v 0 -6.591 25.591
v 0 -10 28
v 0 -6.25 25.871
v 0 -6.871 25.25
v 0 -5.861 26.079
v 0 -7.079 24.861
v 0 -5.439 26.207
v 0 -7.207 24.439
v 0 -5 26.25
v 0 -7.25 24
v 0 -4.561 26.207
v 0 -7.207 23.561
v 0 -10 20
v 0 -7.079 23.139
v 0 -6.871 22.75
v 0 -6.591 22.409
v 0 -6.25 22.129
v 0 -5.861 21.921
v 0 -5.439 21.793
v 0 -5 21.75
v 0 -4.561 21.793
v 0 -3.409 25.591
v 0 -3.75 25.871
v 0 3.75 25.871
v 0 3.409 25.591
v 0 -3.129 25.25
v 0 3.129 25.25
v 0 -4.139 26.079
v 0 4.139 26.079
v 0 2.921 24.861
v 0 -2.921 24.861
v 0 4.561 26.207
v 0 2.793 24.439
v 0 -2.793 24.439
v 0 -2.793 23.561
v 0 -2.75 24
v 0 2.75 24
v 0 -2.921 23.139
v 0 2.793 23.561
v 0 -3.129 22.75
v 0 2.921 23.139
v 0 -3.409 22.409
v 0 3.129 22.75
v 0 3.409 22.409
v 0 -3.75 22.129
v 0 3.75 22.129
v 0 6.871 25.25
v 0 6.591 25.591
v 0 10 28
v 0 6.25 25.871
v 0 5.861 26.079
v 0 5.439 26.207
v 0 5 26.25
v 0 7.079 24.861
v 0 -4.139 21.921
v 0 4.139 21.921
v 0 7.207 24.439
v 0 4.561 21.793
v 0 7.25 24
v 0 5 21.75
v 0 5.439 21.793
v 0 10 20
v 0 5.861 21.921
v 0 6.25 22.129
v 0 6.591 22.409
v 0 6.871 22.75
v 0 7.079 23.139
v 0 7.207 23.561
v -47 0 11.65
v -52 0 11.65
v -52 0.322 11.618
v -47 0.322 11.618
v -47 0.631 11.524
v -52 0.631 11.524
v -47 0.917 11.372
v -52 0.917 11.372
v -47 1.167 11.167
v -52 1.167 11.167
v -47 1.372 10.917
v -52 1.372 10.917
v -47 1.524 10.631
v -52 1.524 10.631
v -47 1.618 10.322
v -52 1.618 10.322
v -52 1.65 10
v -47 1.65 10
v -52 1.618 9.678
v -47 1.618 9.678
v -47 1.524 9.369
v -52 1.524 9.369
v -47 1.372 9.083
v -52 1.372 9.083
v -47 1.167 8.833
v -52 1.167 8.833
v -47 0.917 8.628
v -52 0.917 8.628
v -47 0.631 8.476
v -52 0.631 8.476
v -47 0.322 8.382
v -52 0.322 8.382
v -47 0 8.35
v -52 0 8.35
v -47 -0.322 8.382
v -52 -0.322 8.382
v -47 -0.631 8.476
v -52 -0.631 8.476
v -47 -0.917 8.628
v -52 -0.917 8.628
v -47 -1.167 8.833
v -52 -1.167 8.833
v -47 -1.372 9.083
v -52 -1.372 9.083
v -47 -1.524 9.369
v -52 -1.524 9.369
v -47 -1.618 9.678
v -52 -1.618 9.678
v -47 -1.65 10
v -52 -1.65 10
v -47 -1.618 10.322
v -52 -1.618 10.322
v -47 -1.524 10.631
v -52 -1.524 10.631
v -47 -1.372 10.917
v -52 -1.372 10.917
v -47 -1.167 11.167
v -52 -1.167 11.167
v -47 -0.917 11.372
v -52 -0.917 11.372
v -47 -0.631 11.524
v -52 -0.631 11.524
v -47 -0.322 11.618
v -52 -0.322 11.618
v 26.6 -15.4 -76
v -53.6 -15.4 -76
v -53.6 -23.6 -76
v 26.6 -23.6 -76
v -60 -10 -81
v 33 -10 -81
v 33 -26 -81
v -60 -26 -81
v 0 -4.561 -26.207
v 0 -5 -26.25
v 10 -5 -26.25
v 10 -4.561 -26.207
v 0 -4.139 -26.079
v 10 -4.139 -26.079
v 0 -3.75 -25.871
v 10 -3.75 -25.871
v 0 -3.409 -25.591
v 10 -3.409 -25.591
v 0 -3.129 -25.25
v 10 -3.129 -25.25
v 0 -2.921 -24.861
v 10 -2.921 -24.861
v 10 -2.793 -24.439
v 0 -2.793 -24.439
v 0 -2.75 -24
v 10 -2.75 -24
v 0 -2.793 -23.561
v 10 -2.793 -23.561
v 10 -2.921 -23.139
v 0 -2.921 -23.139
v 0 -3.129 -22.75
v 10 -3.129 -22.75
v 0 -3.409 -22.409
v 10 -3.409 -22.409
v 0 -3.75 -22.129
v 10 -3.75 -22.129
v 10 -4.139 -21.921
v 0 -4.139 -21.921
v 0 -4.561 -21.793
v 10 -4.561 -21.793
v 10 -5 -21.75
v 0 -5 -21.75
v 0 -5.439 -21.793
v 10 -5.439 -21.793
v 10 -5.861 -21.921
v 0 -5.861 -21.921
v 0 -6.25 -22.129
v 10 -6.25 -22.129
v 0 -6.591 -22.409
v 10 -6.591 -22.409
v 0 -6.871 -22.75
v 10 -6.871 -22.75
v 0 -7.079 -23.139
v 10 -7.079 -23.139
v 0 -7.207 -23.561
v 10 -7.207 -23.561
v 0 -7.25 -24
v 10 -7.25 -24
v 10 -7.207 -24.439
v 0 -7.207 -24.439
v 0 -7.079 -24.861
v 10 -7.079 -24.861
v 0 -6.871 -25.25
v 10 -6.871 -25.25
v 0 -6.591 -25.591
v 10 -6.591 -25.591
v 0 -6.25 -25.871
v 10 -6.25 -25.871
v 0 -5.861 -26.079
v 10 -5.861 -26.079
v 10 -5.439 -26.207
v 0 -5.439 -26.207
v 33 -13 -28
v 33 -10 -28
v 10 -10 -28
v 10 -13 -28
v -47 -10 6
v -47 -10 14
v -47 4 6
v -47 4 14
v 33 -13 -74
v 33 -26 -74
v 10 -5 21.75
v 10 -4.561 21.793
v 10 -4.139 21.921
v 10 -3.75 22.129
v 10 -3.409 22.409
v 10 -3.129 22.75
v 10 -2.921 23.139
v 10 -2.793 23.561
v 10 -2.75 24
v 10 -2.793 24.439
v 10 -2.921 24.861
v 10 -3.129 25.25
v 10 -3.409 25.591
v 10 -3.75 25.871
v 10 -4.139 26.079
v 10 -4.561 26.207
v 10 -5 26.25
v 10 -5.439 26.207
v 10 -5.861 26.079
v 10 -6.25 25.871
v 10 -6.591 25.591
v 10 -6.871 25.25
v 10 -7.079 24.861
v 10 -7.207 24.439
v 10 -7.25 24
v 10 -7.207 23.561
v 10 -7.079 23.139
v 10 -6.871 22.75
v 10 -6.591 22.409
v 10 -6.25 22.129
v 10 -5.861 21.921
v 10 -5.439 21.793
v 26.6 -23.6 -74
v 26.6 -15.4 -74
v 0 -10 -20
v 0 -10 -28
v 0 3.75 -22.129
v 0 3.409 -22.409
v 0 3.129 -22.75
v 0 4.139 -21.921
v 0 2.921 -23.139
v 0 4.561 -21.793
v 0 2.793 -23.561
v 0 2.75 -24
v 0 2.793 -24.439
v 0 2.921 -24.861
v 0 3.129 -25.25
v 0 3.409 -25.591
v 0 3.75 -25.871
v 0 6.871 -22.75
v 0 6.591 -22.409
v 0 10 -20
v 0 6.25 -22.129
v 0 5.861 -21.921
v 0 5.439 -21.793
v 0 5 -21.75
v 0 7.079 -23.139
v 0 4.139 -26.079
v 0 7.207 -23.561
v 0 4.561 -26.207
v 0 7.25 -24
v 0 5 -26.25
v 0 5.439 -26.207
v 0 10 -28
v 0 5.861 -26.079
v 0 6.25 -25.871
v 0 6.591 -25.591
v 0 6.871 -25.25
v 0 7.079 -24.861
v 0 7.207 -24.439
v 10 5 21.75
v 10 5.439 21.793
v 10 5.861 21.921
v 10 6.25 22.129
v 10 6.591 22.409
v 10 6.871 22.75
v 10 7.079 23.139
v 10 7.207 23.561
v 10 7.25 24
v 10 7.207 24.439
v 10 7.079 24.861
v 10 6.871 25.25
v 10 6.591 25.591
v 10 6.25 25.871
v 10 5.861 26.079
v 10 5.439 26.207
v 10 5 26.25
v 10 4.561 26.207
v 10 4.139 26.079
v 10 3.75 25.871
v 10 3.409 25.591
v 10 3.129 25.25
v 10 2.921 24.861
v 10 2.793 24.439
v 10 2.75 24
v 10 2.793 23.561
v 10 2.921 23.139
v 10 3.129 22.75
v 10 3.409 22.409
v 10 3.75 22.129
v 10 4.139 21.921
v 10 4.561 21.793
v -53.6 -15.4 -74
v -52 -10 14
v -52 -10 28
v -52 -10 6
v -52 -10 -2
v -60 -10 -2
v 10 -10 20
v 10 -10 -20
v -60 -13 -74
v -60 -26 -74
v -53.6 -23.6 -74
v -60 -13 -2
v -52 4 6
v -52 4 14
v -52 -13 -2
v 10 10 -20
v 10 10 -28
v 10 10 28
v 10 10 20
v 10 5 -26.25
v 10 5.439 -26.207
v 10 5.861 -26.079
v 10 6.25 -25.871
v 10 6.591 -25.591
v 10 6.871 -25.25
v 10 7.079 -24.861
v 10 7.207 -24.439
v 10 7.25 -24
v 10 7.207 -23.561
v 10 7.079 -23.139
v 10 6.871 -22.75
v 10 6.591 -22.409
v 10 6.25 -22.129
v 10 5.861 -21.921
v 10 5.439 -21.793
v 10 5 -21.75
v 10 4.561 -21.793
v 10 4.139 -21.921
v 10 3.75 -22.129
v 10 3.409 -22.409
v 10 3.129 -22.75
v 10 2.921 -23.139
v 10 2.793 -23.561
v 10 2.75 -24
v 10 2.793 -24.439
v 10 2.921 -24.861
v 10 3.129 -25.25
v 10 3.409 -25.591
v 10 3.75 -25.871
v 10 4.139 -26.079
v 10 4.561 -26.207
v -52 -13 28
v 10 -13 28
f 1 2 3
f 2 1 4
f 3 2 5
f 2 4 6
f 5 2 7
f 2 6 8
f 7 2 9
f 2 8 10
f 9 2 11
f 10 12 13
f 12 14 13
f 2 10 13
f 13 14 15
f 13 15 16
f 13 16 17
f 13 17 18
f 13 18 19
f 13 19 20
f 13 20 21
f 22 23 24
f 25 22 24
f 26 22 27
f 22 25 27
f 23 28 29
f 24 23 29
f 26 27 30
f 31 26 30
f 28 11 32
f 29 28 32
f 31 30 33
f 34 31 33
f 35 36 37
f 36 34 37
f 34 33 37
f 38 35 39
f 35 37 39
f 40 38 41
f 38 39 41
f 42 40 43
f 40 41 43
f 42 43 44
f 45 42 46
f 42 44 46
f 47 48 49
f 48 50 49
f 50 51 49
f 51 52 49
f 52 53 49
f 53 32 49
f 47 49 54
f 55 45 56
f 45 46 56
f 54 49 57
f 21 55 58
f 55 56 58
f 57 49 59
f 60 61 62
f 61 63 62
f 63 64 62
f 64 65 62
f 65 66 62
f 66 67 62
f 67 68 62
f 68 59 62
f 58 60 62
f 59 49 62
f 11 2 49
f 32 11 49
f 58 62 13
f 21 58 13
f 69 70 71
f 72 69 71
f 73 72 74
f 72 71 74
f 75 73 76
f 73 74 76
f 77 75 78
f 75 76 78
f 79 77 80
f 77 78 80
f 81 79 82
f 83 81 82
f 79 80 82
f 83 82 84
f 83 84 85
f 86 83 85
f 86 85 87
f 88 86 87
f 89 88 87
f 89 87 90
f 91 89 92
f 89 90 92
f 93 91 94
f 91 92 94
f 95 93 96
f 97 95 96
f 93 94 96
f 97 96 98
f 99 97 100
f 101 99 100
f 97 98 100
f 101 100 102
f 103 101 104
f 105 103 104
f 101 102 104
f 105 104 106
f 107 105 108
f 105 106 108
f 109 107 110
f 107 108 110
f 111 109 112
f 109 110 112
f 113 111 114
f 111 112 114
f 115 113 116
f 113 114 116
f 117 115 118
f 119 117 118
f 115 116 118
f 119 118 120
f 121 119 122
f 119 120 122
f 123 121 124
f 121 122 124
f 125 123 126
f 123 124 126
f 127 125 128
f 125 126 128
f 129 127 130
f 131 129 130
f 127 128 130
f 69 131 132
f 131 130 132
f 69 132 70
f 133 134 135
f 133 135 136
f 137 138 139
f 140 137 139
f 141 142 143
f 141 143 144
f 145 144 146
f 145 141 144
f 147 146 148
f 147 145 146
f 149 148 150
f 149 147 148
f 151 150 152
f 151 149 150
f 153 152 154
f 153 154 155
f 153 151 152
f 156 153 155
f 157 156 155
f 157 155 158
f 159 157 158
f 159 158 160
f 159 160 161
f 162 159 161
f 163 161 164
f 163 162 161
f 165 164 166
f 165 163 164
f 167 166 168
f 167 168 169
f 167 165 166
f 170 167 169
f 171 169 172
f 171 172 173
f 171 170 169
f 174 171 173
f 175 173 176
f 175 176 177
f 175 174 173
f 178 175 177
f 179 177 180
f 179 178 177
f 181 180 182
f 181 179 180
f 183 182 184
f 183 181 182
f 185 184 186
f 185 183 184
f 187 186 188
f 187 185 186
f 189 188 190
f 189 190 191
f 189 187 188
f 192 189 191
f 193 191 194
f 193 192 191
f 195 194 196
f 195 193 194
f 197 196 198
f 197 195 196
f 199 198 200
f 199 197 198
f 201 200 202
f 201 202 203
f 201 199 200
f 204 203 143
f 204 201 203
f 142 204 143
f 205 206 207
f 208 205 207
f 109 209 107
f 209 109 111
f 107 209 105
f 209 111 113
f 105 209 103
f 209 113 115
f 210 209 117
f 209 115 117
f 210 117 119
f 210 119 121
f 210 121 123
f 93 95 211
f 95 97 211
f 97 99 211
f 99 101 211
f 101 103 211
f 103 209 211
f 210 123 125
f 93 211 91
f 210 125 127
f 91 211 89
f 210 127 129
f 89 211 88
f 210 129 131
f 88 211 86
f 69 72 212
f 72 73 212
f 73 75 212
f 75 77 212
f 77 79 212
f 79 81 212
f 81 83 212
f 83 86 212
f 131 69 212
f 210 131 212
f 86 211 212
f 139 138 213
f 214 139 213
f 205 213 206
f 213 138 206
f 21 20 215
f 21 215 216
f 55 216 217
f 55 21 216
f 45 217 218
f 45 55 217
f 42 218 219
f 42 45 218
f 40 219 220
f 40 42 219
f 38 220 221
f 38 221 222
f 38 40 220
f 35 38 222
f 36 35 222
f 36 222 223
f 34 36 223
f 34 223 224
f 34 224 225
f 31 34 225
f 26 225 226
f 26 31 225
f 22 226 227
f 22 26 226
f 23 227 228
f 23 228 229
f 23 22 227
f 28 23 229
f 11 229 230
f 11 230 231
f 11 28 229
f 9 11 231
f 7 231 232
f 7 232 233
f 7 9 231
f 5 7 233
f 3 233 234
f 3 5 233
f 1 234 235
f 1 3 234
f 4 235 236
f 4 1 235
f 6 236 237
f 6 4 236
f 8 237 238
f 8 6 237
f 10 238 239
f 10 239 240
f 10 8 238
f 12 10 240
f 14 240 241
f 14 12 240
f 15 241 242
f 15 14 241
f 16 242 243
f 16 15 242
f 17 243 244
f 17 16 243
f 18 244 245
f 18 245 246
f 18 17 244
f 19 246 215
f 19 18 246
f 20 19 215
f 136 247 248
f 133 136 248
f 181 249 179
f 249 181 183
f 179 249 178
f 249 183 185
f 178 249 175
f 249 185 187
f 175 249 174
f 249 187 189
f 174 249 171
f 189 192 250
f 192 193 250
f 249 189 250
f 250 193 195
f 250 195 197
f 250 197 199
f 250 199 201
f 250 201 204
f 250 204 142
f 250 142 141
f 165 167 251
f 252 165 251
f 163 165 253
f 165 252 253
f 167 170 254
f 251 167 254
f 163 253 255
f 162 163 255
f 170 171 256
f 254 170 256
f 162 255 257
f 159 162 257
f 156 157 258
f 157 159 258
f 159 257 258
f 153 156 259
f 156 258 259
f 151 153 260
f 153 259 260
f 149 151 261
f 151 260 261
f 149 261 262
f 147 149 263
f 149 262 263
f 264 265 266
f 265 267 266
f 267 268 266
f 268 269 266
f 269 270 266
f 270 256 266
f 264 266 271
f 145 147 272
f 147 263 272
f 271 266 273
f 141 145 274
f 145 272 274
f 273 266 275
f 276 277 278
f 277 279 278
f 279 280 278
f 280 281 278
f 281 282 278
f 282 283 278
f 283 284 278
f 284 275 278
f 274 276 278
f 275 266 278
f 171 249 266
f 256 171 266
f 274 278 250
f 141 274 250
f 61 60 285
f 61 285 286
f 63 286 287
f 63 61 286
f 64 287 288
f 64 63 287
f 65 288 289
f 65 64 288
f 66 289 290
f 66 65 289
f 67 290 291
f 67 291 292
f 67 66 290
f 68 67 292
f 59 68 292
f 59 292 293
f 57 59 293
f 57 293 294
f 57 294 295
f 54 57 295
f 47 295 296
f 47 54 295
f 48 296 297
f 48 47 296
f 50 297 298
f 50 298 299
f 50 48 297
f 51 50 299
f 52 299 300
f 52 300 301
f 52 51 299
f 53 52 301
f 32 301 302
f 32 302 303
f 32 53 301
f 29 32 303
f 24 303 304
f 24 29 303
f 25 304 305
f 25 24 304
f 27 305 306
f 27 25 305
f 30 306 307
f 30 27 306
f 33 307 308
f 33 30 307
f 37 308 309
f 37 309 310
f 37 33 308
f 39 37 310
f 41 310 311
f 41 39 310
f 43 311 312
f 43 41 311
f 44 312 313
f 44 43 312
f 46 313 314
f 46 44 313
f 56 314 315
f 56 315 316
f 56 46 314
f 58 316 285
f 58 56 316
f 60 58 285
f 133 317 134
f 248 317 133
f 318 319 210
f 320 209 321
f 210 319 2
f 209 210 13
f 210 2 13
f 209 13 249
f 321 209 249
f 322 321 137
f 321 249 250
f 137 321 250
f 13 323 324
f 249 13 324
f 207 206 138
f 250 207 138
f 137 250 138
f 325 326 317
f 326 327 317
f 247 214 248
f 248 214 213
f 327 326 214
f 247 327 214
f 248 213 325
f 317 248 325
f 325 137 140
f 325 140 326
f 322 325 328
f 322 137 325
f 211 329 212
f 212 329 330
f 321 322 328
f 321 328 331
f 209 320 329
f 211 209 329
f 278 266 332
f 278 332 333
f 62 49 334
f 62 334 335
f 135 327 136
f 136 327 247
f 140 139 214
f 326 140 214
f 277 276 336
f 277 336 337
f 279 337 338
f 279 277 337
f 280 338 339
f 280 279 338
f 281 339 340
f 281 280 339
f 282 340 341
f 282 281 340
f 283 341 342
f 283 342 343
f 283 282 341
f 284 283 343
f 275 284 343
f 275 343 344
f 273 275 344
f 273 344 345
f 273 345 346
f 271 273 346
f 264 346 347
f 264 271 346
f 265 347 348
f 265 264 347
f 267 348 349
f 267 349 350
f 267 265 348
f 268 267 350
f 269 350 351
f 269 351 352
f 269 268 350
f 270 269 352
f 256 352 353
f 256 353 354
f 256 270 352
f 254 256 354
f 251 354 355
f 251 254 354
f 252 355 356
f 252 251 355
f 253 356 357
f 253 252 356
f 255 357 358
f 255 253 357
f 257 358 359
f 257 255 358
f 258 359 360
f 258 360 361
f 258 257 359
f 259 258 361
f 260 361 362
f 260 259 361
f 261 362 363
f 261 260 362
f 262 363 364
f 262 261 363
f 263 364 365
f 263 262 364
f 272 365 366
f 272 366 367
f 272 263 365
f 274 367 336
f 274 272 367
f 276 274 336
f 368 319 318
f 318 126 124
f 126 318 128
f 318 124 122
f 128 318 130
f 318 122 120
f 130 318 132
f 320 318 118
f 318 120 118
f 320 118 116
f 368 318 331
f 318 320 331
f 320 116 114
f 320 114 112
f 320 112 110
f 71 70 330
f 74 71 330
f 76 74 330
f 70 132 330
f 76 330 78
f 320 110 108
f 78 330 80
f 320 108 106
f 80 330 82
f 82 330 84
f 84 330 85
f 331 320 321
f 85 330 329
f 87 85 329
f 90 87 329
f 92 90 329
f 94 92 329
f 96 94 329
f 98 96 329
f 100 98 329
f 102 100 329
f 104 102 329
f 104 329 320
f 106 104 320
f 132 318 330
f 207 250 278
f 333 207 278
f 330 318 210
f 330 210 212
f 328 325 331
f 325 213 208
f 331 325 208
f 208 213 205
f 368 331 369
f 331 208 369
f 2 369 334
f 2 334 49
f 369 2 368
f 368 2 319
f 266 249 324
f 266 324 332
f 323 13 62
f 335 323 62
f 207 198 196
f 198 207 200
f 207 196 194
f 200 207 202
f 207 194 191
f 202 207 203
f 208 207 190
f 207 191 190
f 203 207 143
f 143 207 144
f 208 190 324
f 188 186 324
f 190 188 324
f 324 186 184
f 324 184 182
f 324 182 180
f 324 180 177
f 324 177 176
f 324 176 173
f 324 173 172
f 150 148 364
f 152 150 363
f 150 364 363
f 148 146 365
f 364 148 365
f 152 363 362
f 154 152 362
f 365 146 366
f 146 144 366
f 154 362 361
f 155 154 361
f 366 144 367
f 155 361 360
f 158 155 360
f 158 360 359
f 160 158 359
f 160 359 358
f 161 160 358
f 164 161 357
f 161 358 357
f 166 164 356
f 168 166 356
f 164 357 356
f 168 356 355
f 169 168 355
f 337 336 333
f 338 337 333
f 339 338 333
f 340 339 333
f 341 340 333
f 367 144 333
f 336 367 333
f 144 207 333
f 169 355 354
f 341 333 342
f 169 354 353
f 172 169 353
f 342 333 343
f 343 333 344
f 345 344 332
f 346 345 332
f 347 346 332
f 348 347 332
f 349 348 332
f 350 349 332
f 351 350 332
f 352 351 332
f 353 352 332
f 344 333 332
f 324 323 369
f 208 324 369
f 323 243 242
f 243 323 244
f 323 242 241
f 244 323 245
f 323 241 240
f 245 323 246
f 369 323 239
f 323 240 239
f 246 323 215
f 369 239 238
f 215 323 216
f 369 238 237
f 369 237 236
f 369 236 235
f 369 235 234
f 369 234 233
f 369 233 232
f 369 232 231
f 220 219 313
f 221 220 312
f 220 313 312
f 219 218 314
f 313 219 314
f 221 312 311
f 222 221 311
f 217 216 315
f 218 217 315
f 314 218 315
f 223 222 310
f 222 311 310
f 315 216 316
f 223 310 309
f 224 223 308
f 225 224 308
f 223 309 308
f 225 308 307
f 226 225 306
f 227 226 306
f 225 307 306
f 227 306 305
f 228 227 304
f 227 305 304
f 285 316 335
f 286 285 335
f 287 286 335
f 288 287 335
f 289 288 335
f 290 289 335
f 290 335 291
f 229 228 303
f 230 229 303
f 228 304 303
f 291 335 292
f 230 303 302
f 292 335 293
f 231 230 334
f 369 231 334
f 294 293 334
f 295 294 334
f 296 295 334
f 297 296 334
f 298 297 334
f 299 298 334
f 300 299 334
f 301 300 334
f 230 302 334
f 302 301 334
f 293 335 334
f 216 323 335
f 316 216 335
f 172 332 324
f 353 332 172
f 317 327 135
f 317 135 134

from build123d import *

# Parameters (mm, degrees)
ESQUISSE2_W             = 8
ESQUISSE2_H             = 20
ESQUISSE2_R             = 2.25
BOSS_EXTRU_1_DEPTH      = 10
BOSS_EXTRU_1_2_DEPTH    = 10
BOSS_EXTRU_2_DEPTH      = 3
BOSS_EXTRU_5_DEPTH      = 93
ENL_V_MAT_EXTRU_1_REACH = 18
ESQUISSE8_W             = 8
ESQUISSE8_H             = 30
ESQUISSE9_W             = 80.2
ESQUISSE9_H             = 8.2
ENL_V_MAT_EXTRU_2_DEPTH = 2
ESQUISSE10_W            = 8
ESQUISSE10_H            = 14
ESQUISSE10_R            = 1.65
BOSS_EXTRU_6_DEPTH      = 5


with BuildPart() as part:
    # Esquisse2 → Boss.-Extru.1 (new body)
    with BuildSketch(Plane(origin=(0, 0, 0), x_dir=(0, 0, -1), z_dir=(1, 0, 0))):
        with Locations((-24, 0)):
            Rectangle(ESQUISSE2_W, ESQUISSE2_H)
        with Locations((-24, 5)):
            Circle(ESQUISSE2_R, mode=Mode.SUBTRACT)
        with Locations((-24, -5)):
            Circle(ESQUISSE2_R, mode=Mode.SUBTRACT)
    extrude(amount=BOSS_EXTRU_1_DEPTH)



with BuildPart() as body_2:
    # Esquisse2 → Boss.-Extru.1 2 (new body)
    with BuildSketch(Plane(origin=(0, 0, 0), x_dir=(0, 0, -1), z_dir=(1, 0, 0))):
        with Locations((24, 0)):
            Rectangle(ESQUISSE2_W, ESQUISSE2_H)
        with Locations((24, 5)):
            Circle(ESQUISSE2_R, mode=Mode.SUBTRACT)
        with Locations((24, -5)):
            Circle(ESQUISSE2_R, mode=Mode.SUBTRACT)
    extrude(amount=BOSS_EXTRU_1_2_DEPTH)


with BuildPart() as part_1:
    add(part.part)

    add(body_2.part)  # Boss.-Extru.2 merges body 2
    # Esquisse3 → Boss.-Extru.2 (add)
    with BuildSketch(Plane.XZ.offset(10)):
        Polygon((-60, 28), (-60, -72), (33, -72), (33, -28), (10, -28), (10, 28), align=None)
    extrude(amount=BOSS_EXTRU_2_DEPTH)

    # Esquisse7 → Boss.-Extru.5 (add)
    with BuildSketch(Plane(origin=(33, 0, 0), x_dir=(0, 0, -1), z_dir=(1, 0, 0))):
        Polygon((72, -10), (81, -10), (81, -26), (74, -26), (74, -13), (72, -13), align=None)
    extrude(amount=-BOSS_EXTRU_5_DEPTH)

    # Esquisse8 → Enlèv. mat.-Extru.1 (cut, up to next)
    with BuildSketch(Plane(origin=(0, -10, 0), x_dir=(1, 0, 0), z_dir=(0, 1, 0)), mode=Mode.PRIVATE) as enl_v_mat_extru_1_sk1:
        with Locations((-56, -13)):
            Rectangle(ESQUISSE8_W, ESQUISSE8_H)
    enl_v_mat_extru_1_tool1 = extrude(enl_v_mat_extru_1_sk1.sketch, amount=-ENL_V_MAT_EXTRU_1_REACH, mode=Mode.PRIVATE) & part_1.part
    add(enl_v_mat_extru_1_tool1.solids().sort_by_distance((-56, -10, 13))[0], mode=Mode.SUBTRACT)

    # Esquisse9 → Enlèv. mat.-Extru.2 (cut)
    with BuildSketch(Plane.XY.offset(-74)):
        with Locations((-13.5, -19.5)):
            Rectangle(ESQUISSE9_W, ESQUISSE9_H)
    extrude(amount=-ENL_V_MAT_EXTRU_2_DEPTH, mode=Mode.SUBTRACT)

    # Esquisse10 → Boss.-Extru.6 (add)
    with BuildSketch(Plane.ZY.offset(52)):
        with Locations((10, -3)):
            Rectangle(ESQUISSE10_W, ESQUISSE10_H)
        with Locations((10, 0)):
            Circle(ESQUISSE10_R, mode=Mode.SUBTRACT)
    extrude(amount=-BOSS_EXTRU_6_DEPTH)


solid = part_1.part
